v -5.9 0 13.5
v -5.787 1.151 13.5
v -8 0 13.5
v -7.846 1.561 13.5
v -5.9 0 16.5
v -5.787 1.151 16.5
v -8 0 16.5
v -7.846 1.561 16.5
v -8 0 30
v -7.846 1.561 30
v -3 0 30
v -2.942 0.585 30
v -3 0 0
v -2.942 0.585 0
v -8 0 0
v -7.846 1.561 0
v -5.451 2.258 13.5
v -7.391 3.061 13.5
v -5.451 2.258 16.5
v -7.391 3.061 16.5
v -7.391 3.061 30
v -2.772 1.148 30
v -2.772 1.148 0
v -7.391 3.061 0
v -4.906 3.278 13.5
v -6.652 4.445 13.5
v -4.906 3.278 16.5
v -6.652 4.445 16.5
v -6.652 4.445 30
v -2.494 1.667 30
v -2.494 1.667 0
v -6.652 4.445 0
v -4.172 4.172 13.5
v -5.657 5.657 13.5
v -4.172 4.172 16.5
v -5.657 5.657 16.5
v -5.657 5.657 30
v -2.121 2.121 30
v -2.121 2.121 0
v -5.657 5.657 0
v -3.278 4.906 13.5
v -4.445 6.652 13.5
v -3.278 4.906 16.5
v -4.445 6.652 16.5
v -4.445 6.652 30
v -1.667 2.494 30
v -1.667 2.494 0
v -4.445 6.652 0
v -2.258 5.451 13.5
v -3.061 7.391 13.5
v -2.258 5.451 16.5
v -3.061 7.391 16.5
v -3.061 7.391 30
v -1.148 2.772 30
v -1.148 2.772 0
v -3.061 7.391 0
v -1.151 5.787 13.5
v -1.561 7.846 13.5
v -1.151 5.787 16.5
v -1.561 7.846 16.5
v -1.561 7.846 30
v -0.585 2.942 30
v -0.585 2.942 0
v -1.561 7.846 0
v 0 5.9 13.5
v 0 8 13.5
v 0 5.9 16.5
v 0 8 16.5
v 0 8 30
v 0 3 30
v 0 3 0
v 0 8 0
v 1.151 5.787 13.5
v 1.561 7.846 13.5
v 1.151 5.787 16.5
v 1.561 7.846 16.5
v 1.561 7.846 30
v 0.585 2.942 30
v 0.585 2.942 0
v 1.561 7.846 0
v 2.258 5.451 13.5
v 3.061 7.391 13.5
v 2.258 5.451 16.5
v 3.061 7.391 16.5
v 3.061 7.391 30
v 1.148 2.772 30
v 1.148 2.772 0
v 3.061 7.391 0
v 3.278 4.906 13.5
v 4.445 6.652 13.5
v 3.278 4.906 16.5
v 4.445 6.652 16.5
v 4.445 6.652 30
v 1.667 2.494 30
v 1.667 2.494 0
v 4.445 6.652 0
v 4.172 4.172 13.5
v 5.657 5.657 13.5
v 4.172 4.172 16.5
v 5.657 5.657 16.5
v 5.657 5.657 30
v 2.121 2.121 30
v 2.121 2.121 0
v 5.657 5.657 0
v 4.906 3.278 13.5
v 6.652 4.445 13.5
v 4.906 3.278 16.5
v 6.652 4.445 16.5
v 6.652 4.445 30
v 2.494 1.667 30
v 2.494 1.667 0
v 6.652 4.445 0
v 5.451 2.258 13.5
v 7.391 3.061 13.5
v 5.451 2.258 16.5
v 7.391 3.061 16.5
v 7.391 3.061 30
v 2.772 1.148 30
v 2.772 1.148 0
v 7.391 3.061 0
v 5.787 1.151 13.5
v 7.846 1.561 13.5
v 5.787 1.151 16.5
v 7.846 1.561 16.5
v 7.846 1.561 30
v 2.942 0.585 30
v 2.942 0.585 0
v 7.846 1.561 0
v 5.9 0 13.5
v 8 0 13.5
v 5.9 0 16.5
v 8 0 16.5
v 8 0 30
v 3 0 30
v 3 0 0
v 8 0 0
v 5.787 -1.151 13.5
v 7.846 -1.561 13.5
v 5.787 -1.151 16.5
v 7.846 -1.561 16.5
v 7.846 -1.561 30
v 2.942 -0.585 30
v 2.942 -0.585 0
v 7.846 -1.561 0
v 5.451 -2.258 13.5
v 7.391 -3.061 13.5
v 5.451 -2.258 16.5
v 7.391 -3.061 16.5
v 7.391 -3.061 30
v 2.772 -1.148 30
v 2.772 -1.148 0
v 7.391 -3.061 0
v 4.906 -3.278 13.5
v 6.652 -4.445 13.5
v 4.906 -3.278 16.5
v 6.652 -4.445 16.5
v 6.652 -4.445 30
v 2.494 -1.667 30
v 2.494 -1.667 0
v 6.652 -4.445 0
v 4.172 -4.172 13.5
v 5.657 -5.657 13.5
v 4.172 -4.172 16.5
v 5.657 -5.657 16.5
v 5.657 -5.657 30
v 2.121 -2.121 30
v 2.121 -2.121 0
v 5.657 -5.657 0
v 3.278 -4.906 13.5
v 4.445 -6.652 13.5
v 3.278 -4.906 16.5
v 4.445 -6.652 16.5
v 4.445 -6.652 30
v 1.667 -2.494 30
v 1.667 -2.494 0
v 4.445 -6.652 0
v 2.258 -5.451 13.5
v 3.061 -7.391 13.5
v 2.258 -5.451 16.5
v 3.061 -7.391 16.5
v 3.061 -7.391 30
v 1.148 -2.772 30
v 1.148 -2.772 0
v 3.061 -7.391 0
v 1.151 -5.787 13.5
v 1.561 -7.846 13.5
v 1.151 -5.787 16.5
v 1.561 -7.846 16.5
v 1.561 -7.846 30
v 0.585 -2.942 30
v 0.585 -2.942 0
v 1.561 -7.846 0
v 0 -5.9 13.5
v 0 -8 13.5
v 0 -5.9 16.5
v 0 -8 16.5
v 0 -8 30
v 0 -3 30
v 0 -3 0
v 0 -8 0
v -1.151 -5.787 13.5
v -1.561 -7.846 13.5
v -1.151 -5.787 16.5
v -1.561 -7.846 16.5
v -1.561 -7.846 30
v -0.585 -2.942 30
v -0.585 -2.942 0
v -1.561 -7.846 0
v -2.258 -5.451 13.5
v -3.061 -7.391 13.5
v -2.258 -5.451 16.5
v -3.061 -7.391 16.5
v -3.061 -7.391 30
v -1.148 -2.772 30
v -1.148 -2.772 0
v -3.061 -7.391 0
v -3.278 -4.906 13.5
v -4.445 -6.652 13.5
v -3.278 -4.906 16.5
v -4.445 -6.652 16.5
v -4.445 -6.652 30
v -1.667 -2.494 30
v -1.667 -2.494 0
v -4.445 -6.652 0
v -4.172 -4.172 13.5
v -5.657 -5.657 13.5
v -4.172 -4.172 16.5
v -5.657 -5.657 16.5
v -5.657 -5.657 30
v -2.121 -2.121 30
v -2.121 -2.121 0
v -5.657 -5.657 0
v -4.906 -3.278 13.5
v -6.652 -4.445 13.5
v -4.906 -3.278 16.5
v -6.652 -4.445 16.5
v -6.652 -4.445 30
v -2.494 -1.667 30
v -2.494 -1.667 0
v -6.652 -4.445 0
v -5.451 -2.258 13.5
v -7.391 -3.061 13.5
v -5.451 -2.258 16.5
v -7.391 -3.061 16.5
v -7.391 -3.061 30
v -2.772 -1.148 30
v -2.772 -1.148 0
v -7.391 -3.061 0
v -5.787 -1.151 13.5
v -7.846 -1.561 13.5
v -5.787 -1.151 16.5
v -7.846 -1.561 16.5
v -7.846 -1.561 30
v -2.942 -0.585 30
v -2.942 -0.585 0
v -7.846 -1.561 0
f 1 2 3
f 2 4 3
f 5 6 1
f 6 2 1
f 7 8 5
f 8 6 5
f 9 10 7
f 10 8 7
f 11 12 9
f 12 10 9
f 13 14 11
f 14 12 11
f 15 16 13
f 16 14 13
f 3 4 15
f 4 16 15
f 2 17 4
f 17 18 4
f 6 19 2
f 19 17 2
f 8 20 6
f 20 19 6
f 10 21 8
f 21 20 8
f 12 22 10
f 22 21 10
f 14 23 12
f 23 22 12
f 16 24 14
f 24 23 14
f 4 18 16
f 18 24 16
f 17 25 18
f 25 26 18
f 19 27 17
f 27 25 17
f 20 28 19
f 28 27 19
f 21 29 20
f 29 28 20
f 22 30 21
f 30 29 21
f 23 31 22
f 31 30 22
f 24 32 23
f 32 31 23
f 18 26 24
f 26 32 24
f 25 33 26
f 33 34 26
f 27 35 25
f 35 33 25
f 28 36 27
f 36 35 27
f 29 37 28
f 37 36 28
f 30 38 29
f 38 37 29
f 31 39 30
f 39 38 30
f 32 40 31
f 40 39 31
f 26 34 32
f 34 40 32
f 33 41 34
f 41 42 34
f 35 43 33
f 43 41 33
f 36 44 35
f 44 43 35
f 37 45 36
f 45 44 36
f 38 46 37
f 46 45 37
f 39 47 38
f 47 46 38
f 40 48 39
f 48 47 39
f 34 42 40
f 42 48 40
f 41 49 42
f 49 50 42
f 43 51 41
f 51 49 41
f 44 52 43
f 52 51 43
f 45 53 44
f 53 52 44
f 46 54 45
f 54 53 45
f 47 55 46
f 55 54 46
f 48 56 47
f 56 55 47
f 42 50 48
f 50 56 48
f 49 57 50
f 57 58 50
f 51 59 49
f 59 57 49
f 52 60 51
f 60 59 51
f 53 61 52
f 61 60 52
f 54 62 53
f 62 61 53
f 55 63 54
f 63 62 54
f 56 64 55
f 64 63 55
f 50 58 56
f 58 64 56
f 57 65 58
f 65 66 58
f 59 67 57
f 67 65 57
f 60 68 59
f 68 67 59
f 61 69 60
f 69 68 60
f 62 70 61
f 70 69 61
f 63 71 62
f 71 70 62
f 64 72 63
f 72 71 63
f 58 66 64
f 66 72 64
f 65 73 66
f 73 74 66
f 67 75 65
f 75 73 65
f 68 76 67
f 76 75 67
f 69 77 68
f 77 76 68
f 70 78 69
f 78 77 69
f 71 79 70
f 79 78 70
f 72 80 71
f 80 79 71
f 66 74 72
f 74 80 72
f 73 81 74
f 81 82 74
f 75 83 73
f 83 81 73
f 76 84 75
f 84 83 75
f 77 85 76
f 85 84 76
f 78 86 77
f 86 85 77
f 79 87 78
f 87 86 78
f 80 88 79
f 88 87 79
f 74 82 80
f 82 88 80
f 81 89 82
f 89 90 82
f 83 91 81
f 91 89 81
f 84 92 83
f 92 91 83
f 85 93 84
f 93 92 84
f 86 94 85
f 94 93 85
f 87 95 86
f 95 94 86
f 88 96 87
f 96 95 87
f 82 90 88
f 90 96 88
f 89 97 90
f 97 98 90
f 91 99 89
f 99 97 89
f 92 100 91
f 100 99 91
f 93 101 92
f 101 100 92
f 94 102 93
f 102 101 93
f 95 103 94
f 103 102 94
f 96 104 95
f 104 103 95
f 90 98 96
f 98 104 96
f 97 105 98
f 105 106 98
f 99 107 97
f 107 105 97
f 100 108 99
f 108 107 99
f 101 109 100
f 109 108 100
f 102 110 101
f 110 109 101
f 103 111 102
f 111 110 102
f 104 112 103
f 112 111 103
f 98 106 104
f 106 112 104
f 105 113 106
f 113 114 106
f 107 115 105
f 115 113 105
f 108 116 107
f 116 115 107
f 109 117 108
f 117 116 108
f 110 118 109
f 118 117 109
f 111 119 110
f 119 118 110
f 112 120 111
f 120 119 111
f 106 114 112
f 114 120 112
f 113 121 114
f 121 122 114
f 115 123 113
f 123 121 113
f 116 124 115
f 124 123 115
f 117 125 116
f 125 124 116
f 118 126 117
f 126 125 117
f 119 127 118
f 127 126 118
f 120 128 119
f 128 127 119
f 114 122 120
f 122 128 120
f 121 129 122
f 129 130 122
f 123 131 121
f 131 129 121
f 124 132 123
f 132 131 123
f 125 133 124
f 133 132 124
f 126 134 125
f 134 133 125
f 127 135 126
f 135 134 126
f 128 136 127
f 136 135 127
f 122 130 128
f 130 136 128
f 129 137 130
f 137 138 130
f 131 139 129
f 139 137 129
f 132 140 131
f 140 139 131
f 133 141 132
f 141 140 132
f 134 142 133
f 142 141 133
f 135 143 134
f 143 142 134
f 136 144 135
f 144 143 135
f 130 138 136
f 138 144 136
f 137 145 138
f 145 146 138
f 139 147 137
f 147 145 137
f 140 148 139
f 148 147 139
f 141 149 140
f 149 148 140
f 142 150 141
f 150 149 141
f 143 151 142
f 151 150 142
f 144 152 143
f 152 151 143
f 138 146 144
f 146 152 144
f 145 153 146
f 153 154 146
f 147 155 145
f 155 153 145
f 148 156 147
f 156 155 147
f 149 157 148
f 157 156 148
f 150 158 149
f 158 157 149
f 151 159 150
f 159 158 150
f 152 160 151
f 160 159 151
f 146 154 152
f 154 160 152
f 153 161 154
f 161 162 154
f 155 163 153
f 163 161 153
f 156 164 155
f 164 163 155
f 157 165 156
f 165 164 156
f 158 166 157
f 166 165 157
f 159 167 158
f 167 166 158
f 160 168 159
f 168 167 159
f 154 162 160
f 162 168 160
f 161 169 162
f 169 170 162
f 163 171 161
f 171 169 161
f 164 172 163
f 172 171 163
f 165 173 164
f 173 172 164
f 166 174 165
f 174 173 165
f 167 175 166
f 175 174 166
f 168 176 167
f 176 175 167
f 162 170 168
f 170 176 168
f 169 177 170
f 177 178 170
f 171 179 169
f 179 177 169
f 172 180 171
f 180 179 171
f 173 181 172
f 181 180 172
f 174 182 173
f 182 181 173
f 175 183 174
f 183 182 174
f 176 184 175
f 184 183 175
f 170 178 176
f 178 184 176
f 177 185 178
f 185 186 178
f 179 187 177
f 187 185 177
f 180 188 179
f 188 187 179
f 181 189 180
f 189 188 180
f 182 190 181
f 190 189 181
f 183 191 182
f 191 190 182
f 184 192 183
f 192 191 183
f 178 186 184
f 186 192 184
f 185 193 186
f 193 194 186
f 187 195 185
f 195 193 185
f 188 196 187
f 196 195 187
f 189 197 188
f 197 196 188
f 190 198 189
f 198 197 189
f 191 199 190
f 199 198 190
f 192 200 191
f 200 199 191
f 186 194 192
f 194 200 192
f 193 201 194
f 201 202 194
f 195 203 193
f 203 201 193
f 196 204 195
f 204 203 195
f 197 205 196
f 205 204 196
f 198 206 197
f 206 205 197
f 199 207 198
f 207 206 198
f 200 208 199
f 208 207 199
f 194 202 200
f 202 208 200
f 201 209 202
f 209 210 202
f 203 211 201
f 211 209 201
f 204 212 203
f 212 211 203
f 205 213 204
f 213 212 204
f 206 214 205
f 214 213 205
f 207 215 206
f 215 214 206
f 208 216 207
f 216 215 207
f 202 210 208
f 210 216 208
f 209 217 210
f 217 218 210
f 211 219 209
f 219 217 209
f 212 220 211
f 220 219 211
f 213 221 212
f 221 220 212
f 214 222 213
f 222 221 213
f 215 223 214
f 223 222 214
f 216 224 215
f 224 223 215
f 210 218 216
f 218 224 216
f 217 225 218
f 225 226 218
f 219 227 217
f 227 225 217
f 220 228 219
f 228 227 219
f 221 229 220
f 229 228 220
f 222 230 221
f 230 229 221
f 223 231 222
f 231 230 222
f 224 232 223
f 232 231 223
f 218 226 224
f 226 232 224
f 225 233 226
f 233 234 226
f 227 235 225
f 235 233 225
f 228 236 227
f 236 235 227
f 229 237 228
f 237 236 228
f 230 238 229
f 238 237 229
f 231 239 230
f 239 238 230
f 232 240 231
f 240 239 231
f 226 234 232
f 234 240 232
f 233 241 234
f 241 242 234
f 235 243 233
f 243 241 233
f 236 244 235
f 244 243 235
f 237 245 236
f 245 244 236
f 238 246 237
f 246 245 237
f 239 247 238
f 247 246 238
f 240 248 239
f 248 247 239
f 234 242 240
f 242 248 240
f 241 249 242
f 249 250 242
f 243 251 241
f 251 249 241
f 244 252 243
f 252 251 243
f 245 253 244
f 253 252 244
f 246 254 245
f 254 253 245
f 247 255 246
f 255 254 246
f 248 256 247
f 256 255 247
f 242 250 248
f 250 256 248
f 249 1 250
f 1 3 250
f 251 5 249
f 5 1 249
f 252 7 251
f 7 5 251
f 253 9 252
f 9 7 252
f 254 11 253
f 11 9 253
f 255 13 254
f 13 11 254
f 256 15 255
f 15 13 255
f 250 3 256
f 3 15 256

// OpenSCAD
$fn = 32;

// ----------------------------------------------------------------------
// Grooved revolve: stepped, bore R3
// ----------------------------------------------------------------------

// --- parameters (mm) ---
bore_r = 3;               // bore radius
outer_r = 8;              // outer radius of the body
total_h = 30;             // overall height, Z
wall = 5;                 // radial wall thickness
groove_w = 3;             // groove width
groove_d = 2.1;           // groove depth
grooves = 1;              // number of outer grooves

bbox_x = 2 * outer_r;  // full diameter
bore_d = 2 * bore_r;  // bore diameter
body_d = 2 * outer_r;  // body diameter
revolve_angle = 360;  // full turn around the Z axis

profile = [[3, 0], [8, 0], [8, 13.5], [5.9, 13.5], [5.9, 16.5], [8, 16.5], [8, 30], [3, 30]];  // primary outline, 8 points, counter clockwise

// --- the one profile operation ---
rotate_extrude(angle = revolve_angle) polygon(points = profile);
